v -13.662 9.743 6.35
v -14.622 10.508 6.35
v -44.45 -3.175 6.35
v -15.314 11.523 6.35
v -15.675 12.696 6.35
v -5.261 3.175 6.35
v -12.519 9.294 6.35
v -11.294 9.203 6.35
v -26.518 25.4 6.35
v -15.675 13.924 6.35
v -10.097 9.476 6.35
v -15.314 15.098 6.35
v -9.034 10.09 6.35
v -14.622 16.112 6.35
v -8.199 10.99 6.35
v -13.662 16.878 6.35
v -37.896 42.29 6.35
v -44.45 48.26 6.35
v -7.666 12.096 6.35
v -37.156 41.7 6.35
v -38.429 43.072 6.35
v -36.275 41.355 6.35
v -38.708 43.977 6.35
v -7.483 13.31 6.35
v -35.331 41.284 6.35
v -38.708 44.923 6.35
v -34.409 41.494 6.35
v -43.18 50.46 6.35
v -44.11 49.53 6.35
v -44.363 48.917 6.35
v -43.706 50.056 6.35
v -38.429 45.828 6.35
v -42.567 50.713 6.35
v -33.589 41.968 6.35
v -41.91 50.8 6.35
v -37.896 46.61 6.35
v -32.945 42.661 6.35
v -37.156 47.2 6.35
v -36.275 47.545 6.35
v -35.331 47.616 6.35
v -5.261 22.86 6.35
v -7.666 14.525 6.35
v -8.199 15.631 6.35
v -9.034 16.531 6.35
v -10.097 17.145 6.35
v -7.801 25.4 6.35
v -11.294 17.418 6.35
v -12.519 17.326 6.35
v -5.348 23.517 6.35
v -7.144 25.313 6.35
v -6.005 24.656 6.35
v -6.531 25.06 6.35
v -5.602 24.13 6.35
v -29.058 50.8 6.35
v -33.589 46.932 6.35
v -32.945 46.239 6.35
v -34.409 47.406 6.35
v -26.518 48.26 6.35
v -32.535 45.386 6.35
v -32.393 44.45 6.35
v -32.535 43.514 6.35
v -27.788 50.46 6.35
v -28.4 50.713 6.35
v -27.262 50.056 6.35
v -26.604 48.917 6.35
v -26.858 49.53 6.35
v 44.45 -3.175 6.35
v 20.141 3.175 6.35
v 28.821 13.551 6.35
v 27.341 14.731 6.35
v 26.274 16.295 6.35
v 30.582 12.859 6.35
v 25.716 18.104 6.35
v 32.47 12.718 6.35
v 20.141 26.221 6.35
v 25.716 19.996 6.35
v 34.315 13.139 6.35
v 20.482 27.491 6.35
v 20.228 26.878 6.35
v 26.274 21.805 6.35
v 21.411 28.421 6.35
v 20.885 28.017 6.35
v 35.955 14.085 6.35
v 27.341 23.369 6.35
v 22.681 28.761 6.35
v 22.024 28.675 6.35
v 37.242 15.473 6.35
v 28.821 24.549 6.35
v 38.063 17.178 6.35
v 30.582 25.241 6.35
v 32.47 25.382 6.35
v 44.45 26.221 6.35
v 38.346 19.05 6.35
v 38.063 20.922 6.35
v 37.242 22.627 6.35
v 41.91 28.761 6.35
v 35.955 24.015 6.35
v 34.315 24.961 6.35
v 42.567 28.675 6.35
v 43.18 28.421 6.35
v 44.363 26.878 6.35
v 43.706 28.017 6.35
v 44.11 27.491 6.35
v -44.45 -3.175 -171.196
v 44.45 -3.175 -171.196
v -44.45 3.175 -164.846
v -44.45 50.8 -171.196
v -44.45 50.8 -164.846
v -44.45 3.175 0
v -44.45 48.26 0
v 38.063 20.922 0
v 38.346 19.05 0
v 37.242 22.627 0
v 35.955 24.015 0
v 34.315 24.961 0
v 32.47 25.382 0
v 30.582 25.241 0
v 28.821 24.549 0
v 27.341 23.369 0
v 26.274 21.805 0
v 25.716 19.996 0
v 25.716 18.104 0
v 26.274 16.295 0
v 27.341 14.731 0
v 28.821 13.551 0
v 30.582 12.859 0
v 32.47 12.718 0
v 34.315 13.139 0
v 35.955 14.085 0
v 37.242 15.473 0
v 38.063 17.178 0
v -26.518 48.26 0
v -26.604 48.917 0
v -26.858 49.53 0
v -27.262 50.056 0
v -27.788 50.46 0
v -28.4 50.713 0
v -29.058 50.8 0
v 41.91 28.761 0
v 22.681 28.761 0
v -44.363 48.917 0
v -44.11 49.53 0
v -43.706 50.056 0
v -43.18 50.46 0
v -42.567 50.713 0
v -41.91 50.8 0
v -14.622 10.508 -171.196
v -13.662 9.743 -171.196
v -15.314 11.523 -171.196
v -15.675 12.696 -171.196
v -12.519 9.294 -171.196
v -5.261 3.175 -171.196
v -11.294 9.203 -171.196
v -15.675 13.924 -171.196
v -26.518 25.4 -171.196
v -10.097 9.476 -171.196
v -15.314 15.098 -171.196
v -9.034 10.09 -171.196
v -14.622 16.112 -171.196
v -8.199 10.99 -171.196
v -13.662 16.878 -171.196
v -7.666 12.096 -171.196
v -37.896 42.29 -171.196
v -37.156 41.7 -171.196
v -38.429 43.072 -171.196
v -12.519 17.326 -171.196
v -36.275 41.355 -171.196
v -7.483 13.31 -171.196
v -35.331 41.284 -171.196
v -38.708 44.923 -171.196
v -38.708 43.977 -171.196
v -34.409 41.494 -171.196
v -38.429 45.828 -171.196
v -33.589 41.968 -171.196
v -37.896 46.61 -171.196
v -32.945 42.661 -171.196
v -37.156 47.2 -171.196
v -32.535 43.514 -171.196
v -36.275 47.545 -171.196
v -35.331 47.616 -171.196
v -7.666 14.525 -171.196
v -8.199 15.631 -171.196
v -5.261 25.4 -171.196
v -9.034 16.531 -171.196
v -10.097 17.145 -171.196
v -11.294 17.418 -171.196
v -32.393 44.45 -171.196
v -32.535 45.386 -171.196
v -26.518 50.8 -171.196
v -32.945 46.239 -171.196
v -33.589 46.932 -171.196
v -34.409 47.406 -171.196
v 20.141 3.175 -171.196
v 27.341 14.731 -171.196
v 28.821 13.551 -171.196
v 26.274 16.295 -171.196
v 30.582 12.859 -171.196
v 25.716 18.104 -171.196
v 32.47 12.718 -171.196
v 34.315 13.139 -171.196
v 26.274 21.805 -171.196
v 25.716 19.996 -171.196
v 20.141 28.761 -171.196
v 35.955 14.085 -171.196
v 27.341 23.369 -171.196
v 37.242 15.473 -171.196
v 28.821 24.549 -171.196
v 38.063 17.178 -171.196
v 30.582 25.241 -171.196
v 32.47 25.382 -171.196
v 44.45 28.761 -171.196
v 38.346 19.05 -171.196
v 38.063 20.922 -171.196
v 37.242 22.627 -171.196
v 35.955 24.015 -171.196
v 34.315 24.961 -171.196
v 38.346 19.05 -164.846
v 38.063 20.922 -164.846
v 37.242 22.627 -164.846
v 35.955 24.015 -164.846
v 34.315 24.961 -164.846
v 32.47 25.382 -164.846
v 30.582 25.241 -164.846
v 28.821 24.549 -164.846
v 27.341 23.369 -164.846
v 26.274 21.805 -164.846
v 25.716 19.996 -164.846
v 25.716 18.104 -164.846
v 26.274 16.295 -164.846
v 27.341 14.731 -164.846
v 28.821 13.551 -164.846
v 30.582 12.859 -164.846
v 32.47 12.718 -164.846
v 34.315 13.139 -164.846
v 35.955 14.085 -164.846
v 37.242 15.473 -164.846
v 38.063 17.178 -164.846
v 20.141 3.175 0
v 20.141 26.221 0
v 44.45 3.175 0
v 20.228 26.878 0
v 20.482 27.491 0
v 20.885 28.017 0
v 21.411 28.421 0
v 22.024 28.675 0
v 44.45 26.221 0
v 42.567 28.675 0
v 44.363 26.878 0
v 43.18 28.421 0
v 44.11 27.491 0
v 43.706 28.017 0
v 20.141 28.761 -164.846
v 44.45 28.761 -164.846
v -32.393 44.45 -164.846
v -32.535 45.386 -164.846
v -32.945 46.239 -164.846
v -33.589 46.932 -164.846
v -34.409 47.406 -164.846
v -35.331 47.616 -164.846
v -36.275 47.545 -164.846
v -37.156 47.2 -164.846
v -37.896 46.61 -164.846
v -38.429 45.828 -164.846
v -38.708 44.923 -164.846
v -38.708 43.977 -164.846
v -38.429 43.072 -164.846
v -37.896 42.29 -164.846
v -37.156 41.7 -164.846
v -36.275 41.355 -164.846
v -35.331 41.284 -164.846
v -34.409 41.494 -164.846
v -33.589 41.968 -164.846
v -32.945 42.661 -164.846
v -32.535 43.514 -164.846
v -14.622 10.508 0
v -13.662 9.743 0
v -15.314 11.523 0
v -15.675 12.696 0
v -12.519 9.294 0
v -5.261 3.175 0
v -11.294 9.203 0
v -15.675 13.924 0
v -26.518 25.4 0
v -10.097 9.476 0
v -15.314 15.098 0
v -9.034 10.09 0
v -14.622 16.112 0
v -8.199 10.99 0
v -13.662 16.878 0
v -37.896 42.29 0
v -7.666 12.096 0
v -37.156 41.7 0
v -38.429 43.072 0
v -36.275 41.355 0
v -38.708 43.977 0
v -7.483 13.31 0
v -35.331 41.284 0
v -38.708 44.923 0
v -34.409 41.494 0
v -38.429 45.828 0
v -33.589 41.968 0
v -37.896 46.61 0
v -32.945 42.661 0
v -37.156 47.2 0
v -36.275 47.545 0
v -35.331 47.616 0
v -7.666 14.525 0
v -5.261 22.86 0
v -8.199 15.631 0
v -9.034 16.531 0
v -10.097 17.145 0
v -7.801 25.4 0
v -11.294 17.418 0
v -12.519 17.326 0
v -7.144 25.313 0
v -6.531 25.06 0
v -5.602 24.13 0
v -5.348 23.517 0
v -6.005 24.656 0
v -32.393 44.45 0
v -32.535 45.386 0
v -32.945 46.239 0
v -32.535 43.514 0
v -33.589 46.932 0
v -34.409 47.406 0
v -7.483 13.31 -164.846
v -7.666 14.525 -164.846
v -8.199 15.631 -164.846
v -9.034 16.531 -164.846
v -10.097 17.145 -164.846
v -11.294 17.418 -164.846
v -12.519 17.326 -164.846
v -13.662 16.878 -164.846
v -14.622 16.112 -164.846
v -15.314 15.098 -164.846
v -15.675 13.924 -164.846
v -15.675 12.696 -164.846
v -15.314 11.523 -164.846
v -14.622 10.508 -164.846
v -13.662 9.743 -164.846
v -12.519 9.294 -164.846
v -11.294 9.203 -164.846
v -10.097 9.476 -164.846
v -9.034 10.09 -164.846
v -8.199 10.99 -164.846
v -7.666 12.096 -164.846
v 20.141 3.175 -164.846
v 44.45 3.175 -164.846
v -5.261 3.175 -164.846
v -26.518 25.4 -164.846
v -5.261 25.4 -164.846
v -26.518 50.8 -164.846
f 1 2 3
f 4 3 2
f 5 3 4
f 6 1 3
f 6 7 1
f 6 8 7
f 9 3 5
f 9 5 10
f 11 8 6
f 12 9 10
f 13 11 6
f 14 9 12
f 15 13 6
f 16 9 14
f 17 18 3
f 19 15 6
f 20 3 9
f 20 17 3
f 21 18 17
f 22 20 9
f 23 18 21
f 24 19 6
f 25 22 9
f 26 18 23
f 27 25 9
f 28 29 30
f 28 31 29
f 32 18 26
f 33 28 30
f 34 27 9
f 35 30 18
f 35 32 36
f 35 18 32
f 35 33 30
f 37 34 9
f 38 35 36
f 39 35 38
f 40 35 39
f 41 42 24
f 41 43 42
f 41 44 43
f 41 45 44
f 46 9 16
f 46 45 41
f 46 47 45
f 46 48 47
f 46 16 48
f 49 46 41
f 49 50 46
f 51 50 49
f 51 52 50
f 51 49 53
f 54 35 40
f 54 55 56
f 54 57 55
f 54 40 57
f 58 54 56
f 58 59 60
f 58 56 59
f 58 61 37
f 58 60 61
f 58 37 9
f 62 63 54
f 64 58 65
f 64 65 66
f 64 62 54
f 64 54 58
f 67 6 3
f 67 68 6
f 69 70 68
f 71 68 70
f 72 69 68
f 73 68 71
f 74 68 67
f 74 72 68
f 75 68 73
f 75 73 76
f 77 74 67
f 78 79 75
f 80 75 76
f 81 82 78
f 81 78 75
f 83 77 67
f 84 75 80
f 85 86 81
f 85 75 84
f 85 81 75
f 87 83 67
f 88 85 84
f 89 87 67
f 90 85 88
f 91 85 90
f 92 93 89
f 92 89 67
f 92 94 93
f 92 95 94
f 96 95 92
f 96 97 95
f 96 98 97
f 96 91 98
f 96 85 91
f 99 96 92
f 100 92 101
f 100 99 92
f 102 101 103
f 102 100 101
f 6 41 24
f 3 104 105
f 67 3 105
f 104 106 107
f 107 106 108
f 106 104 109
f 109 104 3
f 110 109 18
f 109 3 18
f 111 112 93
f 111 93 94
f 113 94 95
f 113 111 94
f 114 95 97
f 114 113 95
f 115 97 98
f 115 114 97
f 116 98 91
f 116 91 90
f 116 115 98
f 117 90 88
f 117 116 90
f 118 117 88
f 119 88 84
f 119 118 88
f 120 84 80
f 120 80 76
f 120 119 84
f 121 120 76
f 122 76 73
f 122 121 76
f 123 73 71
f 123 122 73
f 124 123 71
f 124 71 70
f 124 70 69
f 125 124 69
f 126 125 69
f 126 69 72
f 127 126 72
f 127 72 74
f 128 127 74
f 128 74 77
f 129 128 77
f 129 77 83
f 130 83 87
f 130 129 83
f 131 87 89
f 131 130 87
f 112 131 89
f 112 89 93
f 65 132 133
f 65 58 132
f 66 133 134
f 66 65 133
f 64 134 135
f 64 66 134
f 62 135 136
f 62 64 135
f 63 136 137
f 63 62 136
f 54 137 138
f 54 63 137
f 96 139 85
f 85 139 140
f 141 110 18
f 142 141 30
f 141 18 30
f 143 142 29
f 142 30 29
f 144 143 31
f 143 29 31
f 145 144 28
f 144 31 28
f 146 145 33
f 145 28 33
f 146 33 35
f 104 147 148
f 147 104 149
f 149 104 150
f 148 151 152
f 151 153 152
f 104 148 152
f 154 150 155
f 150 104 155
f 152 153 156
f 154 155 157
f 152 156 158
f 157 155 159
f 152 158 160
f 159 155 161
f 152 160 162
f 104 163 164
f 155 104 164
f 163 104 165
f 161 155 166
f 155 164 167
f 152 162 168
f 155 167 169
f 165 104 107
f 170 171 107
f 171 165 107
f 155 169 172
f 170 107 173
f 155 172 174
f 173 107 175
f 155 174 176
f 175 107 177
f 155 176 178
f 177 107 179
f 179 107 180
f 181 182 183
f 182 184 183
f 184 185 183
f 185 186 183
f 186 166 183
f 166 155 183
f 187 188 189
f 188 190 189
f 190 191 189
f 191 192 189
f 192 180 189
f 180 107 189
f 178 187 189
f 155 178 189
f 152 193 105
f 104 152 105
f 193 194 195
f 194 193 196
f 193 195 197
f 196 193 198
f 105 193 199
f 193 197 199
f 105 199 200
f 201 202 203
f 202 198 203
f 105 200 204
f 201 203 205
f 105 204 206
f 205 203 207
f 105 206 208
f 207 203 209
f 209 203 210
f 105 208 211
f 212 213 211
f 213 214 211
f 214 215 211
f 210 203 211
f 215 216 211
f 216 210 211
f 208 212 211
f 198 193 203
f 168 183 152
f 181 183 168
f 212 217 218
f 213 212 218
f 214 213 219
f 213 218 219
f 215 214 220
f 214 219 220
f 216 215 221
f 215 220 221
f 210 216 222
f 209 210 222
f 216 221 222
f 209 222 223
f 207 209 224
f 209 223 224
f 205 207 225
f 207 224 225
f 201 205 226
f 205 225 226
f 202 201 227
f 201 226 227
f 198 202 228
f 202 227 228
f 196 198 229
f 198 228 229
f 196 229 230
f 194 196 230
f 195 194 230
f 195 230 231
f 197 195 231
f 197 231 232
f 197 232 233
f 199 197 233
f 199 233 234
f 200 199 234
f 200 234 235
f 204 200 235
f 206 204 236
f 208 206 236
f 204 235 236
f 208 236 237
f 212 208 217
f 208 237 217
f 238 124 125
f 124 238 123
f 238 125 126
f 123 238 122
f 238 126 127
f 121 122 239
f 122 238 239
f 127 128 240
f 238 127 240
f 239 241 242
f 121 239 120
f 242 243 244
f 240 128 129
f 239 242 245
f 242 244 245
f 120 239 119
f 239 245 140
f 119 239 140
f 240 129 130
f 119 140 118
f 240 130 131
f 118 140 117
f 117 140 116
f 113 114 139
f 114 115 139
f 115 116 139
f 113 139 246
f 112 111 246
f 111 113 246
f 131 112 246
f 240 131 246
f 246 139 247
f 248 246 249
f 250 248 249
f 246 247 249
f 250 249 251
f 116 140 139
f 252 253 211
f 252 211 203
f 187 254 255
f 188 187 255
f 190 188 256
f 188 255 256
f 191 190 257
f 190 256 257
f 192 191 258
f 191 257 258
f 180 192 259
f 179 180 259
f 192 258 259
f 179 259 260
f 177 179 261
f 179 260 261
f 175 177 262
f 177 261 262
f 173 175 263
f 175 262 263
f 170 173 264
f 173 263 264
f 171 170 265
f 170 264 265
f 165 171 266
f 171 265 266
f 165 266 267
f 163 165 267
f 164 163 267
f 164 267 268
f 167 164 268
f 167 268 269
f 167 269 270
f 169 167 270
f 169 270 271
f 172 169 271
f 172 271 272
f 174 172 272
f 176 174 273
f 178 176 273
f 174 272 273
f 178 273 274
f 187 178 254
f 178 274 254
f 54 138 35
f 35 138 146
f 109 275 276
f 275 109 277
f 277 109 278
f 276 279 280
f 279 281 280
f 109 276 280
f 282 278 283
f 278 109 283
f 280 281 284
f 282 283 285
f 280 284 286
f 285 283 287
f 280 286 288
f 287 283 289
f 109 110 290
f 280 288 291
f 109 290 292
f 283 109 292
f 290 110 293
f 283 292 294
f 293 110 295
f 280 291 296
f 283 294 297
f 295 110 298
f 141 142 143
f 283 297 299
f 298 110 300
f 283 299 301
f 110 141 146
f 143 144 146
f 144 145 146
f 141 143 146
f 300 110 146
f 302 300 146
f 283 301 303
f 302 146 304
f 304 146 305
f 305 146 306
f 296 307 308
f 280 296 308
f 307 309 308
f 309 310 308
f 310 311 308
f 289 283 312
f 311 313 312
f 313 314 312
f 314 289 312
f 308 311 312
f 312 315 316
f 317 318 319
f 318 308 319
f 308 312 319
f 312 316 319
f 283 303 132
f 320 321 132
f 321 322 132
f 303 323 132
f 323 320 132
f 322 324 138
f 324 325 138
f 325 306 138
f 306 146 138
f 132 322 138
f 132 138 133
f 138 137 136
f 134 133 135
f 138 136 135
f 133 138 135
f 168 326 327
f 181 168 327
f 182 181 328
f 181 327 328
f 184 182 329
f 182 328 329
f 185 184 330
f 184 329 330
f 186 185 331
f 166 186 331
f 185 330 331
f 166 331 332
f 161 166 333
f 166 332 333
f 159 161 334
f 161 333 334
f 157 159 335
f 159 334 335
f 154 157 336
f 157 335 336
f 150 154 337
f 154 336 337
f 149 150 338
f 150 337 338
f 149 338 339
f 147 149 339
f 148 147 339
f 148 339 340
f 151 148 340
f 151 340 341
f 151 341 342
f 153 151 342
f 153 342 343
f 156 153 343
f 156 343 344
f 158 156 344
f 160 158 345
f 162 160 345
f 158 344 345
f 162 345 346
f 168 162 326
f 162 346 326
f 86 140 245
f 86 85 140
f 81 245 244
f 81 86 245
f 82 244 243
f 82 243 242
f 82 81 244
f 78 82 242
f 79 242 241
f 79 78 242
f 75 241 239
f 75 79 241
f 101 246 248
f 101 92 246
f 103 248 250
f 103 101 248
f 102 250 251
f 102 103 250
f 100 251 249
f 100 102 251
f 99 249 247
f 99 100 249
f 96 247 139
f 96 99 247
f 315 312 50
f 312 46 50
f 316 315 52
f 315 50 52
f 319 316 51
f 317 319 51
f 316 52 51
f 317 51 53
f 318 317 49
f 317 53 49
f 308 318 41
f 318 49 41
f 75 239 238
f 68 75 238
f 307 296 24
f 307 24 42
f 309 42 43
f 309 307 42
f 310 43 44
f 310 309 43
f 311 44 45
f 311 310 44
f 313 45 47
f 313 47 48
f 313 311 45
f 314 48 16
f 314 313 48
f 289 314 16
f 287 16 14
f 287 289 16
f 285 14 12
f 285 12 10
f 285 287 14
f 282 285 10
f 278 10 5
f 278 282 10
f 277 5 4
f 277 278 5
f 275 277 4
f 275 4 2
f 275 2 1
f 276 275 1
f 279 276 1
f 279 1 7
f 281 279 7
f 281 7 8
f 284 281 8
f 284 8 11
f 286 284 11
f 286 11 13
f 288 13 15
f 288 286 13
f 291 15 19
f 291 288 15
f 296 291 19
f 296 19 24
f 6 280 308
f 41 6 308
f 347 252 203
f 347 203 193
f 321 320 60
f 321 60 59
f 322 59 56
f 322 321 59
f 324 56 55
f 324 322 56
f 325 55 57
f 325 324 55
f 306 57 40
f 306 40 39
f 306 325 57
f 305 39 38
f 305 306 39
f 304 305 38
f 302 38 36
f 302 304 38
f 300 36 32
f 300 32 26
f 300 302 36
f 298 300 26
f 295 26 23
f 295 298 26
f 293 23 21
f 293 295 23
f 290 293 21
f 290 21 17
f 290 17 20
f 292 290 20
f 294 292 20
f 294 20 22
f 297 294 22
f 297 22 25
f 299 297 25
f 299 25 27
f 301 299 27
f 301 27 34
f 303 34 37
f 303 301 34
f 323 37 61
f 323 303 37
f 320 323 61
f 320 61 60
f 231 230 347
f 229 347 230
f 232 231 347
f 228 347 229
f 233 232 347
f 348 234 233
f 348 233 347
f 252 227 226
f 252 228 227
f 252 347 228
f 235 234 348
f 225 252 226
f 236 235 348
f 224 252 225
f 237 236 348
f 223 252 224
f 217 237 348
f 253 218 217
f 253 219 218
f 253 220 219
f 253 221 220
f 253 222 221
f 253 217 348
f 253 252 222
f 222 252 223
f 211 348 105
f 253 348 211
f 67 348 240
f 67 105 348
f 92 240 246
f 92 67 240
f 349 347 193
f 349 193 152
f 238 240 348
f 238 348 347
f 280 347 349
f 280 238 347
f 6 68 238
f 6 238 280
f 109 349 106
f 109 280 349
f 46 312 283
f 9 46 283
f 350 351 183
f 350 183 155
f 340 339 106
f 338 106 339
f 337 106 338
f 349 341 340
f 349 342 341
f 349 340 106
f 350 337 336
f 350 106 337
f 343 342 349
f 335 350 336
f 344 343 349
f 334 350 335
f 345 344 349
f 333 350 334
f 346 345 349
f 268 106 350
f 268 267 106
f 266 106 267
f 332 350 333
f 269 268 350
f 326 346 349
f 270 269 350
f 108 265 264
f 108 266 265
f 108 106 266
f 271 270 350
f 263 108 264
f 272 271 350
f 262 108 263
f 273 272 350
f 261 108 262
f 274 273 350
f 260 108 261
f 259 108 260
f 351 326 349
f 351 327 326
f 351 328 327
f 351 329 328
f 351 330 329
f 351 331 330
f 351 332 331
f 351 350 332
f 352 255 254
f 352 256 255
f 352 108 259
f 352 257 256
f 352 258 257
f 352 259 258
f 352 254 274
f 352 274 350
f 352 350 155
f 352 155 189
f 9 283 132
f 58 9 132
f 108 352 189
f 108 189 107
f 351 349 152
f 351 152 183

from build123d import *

# Parameters (mm, degrees)
SKETCH1_R           = 6.35
SKETCH1_R_2         = 4.119285102
SKETCH1_R_3         = 3.175
BOSS_EXTRUDE1_DEPTH = 6.35
SKETCH2_W           = 88.9
SKETCH2_H           = 6.35
BOSS_EXTRUDE2_DEPTH = 177.546
FILLET1_R           = 2.54


with BuildPart() as part:
    # Sketch1 → Boss-Extrude1 (new body)
    with BuildSketch(Plane.XY):
        Polygon((44.45, 28.761098675), (20.141329975, 28.761098675), (20.141329975, 3.175), (-5.261436706, 3.175), (-5.261436706, 25.4), (-26.5176, 25.4), (-26.5176, 50.8), (-44.45, 50.8), (-44.45, 3.175), (-44.45, -3.175), (44.45, -3.175), (44.45, 3.175), align=None)
        with Locations((31.995505277, 19.05)):
            Circle(SKETCH1_R, mode=Mode.SUBTRACT)
        with Locations((-11.602215411, 13.310324548)):
            Circle(SKETCH1_R_2, mode=Mode.SUBTRACT)
        with Locations((-35.568494723, 44.45)):
            Circle(SKETCH1_R_3, mode=Mode.SUBTRACT)
    boss_extrude1 = extrude(amount=BOSS_EXTRUDE1_DEPTH)

    # Sketch2 → Boss-Extrude2 (add)
    with BuildSketch(Plane.XY.offset(6.35)):
        Rectangle(SKETCH2_W, SKETCH2_H)
    extrude(amount=-BOSS_EXTRUDE2_DEPTH)

    # Fillet1
    fillet1_edges = [part.edges().sort_by_distance(p)[0] for p in [
        (44.45, 28.761098675, 3.175),
        (-44.45, 50.8, 3.175),
        (-26.5176, 50.8, 3.175),
        (-5.261436706, 25.4, 3.175),
        (20.141329975, 28.761098675, 3.175),
    ]]
    fillet(fillet1_edges, radius=FILLET1_R)

    # Mirror1: Boss-Extrude1 across plane
    add(boss_extrude1.mirror(Plane.XY.offset(-82.423)))


solid = part.part
